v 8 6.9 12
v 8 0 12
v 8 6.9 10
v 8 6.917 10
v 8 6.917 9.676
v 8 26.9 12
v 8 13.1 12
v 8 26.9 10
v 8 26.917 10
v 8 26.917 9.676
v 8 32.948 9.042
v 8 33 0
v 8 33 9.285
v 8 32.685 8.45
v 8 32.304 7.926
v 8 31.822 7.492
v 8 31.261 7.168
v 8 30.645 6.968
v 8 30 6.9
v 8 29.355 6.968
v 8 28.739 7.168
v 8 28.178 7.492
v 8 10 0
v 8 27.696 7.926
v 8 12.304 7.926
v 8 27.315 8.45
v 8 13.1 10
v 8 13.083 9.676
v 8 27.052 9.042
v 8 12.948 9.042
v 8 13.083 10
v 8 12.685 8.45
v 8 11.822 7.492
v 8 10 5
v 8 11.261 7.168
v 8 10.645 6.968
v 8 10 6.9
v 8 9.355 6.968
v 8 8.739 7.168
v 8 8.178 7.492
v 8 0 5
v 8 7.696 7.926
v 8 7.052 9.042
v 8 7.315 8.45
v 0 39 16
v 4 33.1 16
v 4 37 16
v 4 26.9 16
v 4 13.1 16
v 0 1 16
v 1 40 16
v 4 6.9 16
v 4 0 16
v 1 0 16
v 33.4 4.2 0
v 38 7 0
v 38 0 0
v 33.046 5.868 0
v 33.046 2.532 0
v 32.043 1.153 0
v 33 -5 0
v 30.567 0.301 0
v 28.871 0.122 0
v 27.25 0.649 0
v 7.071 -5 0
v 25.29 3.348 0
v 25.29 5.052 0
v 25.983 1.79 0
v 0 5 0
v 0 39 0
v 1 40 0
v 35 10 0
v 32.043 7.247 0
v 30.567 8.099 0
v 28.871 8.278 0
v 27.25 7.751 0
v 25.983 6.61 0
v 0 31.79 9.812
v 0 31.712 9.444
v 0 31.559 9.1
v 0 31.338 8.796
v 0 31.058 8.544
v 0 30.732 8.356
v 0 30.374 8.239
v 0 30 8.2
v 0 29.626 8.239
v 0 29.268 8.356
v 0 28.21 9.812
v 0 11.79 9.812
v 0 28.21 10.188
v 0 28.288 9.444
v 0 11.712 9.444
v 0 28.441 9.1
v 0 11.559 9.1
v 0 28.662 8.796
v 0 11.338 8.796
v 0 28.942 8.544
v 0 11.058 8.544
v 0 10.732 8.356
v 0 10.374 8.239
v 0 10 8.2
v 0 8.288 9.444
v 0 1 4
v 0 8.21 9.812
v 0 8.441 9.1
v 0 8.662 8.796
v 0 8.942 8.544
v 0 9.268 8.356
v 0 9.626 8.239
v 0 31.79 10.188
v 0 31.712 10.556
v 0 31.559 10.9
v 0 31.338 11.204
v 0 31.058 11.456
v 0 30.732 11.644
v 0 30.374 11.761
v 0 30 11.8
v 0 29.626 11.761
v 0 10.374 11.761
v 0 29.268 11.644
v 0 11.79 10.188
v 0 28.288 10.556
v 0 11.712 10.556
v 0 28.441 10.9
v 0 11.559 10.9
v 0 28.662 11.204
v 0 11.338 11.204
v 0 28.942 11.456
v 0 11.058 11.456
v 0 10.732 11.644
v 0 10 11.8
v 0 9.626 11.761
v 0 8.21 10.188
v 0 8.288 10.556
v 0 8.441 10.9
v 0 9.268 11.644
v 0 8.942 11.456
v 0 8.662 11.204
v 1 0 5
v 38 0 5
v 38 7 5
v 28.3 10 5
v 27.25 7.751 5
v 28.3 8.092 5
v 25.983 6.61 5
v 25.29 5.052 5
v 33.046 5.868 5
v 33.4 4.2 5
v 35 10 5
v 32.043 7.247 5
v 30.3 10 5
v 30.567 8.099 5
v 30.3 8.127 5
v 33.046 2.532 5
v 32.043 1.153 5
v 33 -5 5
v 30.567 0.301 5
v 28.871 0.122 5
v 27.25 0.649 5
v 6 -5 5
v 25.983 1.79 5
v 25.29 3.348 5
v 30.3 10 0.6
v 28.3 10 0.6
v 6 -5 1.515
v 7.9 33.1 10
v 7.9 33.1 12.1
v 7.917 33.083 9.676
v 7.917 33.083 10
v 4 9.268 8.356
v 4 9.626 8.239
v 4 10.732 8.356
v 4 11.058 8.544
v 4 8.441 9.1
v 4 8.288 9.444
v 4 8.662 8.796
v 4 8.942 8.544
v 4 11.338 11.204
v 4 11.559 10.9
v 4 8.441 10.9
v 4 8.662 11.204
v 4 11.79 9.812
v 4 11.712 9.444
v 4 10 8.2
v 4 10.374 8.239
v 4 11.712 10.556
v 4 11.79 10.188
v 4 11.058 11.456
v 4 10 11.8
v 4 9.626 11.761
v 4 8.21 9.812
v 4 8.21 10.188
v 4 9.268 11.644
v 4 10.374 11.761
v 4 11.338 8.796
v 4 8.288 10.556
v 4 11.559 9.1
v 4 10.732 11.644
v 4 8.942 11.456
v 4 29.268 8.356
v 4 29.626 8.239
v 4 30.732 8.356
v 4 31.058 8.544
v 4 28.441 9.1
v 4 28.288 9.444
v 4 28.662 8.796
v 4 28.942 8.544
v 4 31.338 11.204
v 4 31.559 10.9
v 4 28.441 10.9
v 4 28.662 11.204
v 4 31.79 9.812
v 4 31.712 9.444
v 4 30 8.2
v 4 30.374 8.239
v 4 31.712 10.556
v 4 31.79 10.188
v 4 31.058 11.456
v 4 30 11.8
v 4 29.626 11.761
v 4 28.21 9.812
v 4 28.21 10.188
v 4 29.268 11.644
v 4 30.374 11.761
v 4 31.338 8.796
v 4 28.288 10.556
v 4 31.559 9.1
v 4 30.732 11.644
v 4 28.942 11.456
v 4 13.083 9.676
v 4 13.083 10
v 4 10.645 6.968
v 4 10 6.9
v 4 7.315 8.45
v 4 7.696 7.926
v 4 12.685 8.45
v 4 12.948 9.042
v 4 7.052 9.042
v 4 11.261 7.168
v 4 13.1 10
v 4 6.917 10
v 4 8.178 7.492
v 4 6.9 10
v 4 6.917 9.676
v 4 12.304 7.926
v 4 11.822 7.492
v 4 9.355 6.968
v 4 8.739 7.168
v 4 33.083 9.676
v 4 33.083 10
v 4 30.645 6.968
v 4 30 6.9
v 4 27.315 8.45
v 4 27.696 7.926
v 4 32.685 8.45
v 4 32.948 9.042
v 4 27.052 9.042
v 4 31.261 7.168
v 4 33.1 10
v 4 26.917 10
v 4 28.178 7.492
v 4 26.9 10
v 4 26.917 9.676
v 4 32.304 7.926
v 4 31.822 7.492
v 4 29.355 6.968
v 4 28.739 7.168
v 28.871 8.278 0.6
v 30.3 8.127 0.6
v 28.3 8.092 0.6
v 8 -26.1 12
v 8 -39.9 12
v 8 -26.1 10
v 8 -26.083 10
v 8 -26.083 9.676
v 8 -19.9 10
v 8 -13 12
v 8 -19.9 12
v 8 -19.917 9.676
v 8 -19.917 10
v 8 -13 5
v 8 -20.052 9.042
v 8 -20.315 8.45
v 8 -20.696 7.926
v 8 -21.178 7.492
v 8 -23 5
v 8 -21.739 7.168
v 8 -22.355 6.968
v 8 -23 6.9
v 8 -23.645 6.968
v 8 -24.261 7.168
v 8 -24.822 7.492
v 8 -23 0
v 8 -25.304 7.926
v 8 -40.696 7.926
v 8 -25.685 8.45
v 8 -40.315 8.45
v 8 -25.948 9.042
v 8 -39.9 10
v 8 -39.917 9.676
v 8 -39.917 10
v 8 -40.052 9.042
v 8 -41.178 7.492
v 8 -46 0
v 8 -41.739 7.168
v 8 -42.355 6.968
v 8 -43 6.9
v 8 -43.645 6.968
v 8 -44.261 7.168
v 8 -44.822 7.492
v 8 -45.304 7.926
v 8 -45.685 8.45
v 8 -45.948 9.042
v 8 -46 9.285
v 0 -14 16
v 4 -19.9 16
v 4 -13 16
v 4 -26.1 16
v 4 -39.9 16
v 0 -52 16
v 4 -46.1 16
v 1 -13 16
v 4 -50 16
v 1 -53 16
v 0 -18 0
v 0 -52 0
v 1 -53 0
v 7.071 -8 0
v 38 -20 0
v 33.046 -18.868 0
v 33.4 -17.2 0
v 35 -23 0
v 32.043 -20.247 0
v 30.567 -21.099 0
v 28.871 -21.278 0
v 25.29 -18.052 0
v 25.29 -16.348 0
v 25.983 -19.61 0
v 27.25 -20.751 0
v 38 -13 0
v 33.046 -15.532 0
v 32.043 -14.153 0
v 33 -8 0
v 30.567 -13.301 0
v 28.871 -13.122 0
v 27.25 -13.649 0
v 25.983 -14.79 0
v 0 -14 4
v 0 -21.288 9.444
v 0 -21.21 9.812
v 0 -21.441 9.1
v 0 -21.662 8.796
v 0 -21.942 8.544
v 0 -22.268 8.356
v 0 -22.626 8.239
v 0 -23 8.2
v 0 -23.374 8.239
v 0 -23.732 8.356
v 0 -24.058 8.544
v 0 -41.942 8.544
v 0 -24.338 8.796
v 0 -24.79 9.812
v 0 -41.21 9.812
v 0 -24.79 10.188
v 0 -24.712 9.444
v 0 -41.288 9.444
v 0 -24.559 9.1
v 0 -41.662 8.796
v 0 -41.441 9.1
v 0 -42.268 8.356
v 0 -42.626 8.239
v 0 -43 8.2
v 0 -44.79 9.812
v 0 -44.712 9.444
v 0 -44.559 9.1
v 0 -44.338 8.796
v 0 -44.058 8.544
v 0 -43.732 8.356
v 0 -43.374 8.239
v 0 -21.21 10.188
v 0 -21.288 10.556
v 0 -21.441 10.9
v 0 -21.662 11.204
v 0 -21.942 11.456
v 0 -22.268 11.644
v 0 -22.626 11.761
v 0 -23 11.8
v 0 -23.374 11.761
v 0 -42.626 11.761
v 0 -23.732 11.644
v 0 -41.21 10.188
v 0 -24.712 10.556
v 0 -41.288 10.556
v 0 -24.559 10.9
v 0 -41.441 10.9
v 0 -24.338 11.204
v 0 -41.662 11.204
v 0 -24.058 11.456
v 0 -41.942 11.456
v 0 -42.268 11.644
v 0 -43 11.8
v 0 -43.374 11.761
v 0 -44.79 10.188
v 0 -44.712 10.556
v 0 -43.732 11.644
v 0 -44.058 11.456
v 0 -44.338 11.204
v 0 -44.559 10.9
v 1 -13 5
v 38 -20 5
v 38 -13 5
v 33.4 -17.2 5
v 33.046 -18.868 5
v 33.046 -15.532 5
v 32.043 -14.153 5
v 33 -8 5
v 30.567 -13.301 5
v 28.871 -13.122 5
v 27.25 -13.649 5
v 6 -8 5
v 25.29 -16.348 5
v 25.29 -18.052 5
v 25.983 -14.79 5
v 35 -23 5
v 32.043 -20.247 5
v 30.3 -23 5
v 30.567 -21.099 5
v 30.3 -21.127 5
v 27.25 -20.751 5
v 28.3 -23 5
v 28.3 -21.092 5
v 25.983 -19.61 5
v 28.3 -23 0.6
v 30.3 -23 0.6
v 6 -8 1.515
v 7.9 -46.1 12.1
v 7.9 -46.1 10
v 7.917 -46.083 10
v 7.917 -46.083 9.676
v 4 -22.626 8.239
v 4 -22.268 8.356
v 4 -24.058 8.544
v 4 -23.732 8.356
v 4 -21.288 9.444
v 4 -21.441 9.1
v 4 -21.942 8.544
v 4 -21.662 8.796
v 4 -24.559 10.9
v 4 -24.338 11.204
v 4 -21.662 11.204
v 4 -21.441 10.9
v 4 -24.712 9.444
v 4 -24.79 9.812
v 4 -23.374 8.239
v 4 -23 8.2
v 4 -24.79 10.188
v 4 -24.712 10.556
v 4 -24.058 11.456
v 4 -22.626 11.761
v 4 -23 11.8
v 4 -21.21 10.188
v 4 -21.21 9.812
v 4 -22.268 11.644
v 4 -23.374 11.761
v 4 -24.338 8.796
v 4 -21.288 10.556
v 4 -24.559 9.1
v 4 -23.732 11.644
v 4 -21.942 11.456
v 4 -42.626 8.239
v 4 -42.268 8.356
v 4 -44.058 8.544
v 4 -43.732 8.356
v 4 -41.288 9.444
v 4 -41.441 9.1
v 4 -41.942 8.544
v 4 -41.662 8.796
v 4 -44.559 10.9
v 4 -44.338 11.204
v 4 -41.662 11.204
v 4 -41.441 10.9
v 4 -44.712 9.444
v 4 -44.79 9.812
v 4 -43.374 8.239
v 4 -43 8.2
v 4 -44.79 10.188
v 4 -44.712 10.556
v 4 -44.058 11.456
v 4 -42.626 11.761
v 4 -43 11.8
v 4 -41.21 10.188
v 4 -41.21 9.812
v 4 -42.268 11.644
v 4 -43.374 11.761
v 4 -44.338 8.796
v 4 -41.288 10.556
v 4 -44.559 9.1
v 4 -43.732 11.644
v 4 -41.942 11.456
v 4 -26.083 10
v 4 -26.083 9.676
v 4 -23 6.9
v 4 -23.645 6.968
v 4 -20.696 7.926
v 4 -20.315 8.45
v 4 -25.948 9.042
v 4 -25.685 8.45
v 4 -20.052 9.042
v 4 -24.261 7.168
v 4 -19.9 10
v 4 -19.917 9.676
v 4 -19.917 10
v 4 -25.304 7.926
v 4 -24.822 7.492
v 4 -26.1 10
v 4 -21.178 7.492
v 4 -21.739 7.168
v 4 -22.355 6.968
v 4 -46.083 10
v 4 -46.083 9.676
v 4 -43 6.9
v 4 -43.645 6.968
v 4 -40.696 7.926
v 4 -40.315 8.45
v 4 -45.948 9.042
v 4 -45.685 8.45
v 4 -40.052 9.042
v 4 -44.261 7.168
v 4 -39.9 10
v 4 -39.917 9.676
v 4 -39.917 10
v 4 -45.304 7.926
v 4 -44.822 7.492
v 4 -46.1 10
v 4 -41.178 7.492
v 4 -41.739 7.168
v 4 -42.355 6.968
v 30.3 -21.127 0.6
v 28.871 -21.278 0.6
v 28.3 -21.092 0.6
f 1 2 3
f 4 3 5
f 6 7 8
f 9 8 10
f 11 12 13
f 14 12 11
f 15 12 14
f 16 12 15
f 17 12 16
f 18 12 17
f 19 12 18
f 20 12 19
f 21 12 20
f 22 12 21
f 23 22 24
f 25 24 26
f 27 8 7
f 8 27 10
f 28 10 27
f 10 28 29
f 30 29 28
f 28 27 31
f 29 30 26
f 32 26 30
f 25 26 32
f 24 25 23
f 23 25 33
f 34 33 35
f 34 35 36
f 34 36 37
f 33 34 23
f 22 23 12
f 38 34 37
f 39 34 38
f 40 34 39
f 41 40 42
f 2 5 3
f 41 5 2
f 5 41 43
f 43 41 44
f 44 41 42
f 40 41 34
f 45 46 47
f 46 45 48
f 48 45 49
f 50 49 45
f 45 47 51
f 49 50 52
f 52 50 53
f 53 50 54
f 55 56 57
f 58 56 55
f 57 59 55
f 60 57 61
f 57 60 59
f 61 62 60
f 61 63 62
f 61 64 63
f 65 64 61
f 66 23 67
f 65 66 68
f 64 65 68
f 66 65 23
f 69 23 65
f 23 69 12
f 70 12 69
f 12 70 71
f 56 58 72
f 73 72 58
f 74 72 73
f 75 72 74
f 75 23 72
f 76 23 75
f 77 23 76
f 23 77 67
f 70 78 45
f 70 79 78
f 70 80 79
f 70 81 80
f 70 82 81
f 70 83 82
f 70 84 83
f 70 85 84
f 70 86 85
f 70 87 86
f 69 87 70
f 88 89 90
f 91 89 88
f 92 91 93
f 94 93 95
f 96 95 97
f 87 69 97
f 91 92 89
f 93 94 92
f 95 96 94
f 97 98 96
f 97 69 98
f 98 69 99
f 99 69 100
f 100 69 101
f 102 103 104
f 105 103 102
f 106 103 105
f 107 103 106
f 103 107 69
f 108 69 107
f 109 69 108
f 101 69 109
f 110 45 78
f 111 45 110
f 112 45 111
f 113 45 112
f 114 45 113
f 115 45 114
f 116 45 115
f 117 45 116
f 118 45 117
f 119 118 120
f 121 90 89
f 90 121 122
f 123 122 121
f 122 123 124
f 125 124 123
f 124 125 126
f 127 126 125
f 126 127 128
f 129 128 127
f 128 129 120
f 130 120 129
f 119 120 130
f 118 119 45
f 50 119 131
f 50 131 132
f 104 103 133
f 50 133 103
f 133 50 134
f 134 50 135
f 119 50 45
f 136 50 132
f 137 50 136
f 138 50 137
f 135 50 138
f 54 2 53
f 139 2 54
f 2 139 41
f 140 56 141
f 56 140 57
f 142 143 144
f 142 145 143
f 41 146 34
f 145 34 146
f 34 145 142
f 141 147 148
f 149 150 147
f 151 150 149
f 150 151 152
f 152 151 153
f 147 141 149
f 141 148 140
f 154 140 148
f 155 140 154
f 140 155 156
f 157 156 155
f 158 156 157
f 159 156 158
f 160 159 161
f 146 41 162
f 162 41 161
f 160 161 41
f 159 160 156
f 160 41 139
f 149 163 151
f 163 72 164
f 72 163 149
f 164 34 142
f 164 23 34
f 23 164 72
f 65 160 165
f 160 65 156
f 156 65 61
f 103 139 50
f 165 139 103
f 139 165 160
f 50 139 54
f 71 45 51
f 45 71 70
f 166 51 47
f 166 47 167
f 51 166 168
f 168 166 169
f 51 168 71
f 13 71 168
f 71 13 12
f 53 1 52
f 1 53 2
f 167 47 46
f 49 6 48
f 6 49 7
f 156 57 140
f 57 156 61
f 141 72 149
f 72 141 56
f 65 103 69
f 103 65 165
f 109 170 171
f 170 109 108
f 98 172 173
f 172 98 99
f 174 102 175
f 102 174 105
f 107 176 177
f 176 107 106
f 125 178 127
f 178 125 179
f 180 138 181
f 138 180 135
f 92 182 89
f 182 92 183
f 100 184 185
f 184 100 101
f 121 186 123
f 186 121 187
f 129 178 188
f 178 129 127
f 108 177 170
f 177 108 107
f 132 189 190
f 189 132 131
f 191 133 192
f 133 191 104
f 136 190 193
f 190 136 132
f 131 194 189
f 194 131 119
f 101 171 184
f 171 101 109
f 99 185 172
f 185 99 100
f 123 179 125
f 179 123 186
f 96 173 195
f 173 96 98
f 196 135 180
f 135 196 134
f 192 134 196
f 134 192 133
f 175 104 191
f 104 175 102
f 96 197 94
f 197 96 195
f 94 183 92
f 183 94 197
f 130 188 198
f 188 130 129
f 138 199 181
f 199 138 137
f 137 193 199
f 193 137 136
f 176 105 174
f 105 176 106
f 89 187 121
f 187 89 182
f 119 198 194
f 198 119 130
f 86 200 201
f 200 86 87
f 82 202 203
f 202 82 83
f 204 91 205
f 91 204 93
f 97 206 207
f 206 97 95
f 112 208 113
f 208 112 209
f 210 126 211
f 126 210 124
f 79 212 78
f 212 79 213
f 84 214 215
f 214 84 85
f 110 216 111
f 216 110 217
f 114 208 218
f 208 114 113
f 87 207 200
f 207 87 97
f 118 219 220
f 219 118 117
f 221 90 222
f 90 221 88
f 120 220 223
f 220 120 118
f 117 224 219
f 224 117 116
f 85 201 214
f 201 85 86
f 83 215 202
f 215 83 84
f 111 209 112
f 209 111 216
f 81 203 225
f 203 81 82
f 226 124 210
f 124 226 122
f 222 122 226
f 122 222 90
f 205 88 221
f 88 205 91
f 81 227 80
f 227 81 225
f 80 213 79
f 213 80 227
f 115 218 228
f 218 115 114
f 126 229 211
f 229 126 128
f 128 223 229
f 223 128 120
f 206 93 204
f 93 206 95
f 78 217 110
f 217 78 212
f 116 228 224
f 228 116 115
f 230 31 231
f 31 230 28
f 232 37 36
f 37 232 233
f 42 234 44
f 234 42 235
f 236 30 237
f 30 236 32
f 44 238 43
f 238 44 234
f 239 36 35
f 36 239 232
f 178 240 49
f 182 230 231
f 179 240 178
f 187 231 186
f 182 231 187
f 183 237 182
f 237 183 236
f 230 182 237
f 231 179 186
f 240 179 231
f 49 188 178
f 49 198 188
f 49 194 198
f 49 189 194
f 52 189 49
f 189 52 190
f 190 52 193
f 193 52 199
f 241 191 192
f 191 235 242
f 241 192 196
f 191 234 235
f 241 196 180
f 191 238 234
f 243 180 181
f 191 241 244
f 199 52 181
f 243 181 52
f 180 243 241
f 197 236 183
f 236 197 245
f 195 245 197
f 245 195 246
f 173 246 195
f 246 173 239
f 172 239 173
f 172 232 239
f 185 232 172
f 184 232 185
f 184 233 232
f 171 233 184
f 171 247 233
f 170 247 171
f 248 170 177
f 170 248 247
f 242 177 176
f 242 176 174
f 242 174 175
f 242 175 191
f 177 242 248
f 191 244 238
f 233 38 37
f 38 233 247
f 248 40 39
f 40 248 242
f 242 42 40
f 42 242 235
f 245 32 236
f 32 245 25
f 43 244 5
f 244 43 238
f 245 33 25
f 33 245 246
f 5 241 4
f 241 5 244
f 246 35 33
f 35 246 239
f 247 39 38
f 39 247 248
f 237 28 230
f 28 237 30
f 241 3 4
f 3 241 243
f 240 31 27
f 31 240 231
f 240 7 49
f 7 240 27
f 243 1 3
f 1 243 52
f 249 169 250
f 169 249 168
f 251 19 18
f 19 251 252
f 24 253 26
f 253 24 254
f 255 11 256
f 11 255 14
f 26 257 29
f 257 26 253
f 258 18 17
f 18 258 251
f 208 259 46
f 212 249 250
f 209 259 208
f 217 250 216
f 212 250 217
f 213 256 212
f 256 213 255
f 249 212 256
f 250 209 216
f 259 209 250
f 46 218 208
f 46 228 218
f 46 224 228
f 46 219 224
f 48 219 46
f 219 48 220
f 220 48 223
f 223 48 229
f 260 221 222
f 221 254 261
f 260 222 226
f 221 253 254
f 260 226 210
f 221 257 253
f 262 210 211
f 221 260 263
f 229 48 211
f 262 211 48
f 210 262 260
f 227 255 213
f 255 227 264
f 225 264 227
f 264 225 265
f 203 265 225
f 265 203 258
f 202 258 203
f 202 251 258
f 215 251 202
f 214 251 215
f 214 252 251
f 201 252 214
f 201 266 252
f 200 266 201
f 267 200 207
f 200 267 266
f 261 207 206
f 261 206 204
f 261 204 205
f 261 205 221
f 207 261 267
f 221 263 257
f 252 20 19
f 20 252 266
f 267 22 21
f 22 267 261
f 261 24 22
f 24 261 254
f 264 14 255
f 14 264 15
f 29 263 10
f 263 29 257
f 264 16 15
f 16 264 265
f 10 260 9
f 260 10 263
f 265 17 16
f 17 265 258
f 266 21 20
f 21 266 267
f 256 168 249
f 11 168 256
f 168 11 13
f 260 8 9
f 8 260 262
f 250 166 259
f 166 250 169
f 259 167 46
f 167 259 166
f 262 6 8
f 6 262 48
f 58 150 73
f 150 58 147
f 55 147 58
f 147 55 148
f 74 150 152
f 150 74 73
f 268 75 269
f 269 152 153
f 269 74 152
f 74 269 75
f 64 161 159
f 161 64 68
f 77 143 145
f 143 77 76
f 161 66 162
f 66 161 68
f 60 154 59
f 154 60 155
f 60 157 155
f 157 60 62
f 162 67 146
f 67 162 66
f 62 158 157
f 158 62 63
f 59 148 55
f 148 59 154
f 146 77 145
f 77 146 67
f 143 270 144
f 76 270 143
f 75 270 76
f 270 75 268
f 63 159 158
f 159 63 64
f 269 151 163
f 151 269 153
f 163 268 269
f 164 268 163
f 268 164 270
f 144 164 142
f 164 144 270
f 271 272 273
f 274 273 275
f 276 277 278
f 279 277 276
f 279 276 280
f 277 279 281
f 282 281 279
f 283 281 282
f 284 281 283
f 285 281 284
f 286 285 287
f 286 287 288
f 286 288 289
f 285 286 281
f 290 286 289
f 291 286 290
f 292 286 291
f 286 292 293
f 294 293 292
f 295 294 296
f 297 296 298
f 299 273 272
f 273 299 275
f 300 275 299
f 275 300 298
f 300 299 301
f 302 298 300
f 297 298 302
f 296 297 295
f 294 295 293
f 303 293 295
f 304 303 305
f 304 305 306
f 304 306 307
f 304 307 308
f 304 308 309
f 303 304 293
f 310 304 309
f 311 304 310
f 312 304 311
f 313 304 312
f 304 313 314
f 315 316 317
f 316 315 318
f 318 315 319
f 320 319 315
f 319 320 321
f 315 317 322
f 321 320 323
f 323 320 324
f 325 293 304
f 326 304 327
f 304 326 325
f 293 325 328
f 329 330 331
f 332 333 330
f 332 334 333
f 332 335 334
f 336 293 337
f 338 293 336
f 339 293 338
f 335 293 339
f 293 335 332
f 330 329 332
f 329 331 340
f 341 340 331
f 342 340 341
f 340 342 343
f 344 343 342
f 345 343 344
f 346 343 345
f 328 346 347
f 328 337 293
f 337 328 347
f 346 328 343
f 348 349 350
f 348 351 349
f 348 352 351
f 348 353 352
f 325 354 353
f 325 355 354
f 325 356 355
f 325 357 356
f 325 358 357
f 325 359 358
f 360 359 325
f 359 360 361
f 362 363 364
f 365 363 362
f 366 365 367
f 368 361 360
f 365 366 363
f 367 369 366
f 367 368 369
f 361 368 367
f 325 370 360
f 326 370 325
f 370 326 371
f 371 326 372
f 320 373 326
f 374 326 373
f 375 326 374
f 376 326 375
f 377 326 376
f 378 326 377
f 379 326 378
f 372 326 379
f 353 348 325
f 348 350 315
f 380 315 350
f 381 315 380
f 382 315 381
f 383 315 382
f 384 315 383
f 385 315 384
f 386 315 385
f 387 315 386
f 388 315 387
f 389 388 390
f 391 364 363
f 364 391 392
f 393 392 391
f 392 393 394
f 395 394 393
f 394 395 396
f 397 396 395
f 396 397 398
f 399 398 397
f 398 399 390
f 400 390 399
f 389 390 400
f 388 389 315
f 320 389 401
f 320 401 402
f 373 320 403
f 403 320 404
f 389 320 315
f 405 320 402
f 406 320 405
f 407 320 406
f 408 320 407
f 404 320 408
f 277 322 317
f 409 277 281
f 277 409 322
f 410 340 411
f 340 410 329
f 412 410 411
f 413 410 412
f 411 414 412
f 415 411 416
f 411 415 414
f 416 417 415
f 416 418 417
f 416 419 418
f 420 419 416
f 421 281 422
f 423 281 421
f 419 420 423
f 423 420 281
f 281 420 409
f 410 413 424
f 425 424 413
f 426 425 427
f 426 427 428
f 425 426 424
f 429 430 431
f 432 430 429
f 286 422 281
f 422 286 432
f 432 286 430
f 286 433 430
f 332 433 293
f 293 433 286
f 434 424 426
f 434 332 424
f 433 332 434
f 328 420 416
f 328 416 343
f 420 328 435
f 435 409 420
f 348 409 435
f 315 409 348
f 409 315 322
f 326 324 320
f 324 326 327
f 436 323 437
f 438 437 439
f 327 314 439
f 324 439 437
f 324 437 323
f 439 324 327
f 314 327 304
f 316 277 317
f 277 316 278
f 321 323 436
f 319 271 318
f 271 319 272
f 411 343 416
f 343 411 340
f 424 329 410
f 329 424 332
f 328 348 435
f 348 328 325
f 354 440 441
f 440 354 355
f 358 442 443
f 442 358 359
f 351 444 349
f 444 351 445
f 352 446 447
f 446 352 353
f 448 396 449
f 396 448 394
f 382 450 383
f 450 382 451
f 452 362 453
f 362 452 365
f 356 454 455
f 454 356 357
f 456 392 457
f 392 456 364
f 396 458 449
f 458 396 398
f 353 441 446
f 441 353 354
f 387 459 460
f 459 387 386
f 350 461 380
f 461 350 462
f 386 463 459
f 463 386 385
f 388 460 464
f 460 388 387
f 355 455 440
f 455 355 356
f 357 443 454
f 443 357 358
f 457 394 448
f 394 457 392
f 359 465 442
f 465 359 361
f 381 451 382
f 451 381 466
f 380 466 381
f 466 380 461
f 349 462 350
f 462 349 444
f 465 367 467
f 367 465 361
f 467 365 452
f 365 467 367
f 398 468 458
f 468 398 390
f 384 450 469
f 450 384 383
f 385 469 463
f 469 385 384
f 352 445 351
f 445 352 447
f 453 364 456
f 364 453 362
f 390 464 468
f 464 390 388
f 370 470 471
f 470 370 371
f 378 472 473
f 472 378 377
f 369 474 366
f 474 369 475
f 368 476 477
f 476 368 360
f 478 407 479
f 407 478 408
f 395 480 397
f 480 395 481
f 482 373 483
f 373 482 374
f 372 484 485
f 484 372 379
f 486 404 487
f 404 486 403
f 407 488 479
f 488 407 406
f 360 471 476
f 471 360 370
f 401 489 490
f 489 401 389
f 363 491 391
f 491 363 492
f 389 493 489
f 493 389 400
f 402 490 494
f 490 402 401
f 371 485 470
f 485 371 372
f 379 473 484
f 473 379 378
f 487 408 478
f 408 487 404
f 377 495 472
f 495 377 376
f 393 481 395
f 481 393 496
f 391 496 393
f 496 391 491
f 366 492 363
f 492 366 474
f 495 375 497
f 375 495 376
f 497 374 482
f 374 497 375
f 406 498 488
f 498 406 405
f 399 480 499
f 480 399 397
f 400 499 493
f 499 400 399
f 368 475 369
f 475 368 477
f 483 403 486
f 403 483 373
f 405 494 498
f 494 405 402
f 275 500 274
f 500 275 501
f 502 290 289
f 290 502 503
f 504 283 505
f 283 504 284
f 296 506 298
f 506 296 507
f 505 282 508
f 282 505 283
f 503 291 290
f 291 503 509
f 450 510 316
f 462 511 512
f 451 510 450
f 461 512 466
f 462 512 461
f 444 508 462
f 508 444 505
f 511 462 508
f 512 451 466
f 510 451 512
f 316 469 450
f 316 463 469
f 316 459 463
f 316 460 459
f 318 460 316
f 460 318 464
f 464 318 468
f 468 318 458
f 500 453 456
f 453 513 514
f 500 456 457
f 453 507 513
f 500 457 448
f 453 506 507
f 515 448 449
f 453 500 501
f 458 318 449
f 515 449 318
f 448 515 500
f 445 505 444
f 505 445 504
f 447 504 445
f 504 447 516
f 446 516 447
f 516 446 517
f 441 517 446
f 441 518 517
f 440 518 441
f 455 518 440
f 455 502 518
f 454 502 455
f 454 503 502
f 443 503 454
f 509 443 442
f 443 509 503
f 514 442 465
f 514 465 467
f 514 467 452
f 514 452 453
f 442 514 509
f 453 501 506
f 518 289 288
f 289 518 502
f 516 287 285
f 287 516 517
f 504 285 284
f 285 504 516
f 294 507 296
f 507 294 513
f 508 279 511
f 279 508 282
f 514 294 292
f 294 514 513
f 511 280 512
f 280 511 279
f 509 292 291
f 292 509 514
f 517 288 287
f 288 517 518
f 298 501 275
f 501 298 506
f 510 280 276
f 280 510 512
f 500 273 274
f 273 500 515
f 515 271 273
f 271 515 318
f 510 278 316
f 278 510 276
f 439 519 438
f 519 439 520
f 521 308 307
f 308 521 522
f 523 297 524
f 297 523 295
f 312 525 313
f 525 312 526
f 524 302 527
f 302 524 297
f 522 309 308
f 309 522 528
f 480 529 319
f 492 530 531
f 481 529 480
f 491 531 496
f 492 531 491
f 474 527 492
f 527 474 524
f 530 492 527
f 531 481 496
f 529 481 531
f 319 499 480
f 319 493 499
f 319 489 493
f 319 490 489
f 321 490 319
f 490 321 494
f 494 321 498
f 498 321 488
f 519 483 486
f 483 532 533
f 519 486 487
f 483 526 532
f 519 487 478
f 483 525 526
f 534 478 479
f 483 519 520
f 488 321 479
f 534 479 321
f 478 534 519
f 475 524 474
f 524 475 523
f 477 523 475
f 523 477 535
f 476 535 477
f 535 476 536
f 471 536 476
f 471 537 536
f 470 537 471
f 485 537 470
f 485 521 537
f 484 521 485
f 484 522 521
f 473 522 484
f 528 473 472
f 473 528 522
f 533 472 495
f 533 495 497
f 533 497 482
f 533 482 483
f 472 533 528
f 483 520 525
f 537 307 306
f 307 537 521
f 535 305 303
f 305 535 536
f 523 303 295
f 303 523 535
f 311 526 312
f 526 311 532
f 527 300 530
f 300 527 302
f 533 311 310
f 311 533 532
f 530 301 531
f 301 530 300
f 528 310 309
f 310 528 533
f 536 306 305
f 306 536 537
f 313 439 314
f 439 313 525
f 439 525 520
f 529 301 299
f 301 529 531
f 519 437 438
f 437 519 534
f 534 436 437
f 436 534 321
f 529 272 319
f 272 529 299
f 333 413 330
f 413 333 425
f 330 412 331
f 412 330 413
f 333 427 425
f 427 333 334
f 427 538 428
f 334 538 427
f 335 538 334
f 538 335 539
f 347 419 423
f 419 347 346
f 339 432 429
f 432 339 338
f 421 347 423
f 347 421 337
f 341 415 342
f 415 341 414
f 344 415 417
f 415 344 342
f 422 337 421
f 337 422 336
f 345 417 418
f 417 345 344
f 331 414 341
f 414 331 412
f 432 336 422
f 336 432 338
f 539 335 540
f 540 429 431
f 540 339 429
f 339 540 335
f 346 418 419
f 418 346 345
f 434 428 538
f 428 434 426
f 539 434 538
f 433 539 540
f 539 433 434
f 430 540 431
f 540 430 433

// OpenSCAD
// PRUSA iteration3
// Z axis top holder
// GNU GPL v3
// Josef Průša <iam@josefprusa.cz> and contributors
// http://www.reprap.org/wiki/Prusa_Mendel
// http://prusamendel.org

module z_top_base(){
 translate([0,0,0]) cube([8,40,16]); // plate touching the base
 translate([0,-5,0]) cube([38,15,5]); // plate touching the base
}

module z_top_fancy(){
 // Corner cutouts
 translate([0.5,0.5,0]) rotate([0,0,-45-180]) translate([-15,0,-1]) cube([30,30,51]);
 translate([0.5,40-0.5,0]) rotate([0,0,-45+90]) translate([-15,0,-1]) cube([30,30,51]);
 translate([-4,40+5,0]) rotate([0,0,-45-0]) translate([0,0,-1]) cube([30,30,51]);
 translate([8,0,12]) rotate([0,-45,0]) translate([0,-5,0]) cube([30,50,30]);
 translate([38-2.5,-5+2.5,0]) rotate([0,0,-45-90]) translate([-15,0,-1]) cube([30,30,51]);
 translate([38-1.5,10-1.5,0]) rotate([0,0,-45]) translate([-15,0,-1]) cube([30,30,51]);
 translate([0,0,5]) rotate([45+180,0,0]) rotate([0,0,-45+90]) translate([0,0,-15]) cube([30,30,30]);
}

module z_top_holes(){
 // Screw holes
 translate([-1,10,10]) rotate([0,90,0]) cylinder(h = 20, r=1.8, $fn=30);
 translate([-1,10+20,10]) rotate([0,90,0]) cylinder(h = 20, r=1.8, $fn=30);

 // Screw heads
 translate([4,10,10]) rotate([0,90,0]) cylinder(h = 20, r=3.1, $fn=30);
 translate([4,10-3.1,10]) cube([10,6.2,10]);
 translate([4,10+20,10]) rotate([0,90,0]) cylinder(h = 20, r=3.1, $fn=30);
 translate([4,10+20-3.1,10]) cube([10,6.2,10]);

 // Z rod holder
 translate([25+4.3,4.2,-1]) rotate([0,0,0]) cylinder(h = 50, r=4.1, $fn=15);
 translate([25+4.3-1,3,0.6]) cube([2,10,7]); // it's bit up because it helps with printing
}

// Final part
module z_top(){
 difference(){
  z_top_base();
  z_top_fancy();
  z_top_holes();
 }
 translate([0,-13,0]) mirror([0,1,0]) difference(){
  z_top_base();
  z_top_fancy();
  z_top_holes();
 }
}

z_top();
